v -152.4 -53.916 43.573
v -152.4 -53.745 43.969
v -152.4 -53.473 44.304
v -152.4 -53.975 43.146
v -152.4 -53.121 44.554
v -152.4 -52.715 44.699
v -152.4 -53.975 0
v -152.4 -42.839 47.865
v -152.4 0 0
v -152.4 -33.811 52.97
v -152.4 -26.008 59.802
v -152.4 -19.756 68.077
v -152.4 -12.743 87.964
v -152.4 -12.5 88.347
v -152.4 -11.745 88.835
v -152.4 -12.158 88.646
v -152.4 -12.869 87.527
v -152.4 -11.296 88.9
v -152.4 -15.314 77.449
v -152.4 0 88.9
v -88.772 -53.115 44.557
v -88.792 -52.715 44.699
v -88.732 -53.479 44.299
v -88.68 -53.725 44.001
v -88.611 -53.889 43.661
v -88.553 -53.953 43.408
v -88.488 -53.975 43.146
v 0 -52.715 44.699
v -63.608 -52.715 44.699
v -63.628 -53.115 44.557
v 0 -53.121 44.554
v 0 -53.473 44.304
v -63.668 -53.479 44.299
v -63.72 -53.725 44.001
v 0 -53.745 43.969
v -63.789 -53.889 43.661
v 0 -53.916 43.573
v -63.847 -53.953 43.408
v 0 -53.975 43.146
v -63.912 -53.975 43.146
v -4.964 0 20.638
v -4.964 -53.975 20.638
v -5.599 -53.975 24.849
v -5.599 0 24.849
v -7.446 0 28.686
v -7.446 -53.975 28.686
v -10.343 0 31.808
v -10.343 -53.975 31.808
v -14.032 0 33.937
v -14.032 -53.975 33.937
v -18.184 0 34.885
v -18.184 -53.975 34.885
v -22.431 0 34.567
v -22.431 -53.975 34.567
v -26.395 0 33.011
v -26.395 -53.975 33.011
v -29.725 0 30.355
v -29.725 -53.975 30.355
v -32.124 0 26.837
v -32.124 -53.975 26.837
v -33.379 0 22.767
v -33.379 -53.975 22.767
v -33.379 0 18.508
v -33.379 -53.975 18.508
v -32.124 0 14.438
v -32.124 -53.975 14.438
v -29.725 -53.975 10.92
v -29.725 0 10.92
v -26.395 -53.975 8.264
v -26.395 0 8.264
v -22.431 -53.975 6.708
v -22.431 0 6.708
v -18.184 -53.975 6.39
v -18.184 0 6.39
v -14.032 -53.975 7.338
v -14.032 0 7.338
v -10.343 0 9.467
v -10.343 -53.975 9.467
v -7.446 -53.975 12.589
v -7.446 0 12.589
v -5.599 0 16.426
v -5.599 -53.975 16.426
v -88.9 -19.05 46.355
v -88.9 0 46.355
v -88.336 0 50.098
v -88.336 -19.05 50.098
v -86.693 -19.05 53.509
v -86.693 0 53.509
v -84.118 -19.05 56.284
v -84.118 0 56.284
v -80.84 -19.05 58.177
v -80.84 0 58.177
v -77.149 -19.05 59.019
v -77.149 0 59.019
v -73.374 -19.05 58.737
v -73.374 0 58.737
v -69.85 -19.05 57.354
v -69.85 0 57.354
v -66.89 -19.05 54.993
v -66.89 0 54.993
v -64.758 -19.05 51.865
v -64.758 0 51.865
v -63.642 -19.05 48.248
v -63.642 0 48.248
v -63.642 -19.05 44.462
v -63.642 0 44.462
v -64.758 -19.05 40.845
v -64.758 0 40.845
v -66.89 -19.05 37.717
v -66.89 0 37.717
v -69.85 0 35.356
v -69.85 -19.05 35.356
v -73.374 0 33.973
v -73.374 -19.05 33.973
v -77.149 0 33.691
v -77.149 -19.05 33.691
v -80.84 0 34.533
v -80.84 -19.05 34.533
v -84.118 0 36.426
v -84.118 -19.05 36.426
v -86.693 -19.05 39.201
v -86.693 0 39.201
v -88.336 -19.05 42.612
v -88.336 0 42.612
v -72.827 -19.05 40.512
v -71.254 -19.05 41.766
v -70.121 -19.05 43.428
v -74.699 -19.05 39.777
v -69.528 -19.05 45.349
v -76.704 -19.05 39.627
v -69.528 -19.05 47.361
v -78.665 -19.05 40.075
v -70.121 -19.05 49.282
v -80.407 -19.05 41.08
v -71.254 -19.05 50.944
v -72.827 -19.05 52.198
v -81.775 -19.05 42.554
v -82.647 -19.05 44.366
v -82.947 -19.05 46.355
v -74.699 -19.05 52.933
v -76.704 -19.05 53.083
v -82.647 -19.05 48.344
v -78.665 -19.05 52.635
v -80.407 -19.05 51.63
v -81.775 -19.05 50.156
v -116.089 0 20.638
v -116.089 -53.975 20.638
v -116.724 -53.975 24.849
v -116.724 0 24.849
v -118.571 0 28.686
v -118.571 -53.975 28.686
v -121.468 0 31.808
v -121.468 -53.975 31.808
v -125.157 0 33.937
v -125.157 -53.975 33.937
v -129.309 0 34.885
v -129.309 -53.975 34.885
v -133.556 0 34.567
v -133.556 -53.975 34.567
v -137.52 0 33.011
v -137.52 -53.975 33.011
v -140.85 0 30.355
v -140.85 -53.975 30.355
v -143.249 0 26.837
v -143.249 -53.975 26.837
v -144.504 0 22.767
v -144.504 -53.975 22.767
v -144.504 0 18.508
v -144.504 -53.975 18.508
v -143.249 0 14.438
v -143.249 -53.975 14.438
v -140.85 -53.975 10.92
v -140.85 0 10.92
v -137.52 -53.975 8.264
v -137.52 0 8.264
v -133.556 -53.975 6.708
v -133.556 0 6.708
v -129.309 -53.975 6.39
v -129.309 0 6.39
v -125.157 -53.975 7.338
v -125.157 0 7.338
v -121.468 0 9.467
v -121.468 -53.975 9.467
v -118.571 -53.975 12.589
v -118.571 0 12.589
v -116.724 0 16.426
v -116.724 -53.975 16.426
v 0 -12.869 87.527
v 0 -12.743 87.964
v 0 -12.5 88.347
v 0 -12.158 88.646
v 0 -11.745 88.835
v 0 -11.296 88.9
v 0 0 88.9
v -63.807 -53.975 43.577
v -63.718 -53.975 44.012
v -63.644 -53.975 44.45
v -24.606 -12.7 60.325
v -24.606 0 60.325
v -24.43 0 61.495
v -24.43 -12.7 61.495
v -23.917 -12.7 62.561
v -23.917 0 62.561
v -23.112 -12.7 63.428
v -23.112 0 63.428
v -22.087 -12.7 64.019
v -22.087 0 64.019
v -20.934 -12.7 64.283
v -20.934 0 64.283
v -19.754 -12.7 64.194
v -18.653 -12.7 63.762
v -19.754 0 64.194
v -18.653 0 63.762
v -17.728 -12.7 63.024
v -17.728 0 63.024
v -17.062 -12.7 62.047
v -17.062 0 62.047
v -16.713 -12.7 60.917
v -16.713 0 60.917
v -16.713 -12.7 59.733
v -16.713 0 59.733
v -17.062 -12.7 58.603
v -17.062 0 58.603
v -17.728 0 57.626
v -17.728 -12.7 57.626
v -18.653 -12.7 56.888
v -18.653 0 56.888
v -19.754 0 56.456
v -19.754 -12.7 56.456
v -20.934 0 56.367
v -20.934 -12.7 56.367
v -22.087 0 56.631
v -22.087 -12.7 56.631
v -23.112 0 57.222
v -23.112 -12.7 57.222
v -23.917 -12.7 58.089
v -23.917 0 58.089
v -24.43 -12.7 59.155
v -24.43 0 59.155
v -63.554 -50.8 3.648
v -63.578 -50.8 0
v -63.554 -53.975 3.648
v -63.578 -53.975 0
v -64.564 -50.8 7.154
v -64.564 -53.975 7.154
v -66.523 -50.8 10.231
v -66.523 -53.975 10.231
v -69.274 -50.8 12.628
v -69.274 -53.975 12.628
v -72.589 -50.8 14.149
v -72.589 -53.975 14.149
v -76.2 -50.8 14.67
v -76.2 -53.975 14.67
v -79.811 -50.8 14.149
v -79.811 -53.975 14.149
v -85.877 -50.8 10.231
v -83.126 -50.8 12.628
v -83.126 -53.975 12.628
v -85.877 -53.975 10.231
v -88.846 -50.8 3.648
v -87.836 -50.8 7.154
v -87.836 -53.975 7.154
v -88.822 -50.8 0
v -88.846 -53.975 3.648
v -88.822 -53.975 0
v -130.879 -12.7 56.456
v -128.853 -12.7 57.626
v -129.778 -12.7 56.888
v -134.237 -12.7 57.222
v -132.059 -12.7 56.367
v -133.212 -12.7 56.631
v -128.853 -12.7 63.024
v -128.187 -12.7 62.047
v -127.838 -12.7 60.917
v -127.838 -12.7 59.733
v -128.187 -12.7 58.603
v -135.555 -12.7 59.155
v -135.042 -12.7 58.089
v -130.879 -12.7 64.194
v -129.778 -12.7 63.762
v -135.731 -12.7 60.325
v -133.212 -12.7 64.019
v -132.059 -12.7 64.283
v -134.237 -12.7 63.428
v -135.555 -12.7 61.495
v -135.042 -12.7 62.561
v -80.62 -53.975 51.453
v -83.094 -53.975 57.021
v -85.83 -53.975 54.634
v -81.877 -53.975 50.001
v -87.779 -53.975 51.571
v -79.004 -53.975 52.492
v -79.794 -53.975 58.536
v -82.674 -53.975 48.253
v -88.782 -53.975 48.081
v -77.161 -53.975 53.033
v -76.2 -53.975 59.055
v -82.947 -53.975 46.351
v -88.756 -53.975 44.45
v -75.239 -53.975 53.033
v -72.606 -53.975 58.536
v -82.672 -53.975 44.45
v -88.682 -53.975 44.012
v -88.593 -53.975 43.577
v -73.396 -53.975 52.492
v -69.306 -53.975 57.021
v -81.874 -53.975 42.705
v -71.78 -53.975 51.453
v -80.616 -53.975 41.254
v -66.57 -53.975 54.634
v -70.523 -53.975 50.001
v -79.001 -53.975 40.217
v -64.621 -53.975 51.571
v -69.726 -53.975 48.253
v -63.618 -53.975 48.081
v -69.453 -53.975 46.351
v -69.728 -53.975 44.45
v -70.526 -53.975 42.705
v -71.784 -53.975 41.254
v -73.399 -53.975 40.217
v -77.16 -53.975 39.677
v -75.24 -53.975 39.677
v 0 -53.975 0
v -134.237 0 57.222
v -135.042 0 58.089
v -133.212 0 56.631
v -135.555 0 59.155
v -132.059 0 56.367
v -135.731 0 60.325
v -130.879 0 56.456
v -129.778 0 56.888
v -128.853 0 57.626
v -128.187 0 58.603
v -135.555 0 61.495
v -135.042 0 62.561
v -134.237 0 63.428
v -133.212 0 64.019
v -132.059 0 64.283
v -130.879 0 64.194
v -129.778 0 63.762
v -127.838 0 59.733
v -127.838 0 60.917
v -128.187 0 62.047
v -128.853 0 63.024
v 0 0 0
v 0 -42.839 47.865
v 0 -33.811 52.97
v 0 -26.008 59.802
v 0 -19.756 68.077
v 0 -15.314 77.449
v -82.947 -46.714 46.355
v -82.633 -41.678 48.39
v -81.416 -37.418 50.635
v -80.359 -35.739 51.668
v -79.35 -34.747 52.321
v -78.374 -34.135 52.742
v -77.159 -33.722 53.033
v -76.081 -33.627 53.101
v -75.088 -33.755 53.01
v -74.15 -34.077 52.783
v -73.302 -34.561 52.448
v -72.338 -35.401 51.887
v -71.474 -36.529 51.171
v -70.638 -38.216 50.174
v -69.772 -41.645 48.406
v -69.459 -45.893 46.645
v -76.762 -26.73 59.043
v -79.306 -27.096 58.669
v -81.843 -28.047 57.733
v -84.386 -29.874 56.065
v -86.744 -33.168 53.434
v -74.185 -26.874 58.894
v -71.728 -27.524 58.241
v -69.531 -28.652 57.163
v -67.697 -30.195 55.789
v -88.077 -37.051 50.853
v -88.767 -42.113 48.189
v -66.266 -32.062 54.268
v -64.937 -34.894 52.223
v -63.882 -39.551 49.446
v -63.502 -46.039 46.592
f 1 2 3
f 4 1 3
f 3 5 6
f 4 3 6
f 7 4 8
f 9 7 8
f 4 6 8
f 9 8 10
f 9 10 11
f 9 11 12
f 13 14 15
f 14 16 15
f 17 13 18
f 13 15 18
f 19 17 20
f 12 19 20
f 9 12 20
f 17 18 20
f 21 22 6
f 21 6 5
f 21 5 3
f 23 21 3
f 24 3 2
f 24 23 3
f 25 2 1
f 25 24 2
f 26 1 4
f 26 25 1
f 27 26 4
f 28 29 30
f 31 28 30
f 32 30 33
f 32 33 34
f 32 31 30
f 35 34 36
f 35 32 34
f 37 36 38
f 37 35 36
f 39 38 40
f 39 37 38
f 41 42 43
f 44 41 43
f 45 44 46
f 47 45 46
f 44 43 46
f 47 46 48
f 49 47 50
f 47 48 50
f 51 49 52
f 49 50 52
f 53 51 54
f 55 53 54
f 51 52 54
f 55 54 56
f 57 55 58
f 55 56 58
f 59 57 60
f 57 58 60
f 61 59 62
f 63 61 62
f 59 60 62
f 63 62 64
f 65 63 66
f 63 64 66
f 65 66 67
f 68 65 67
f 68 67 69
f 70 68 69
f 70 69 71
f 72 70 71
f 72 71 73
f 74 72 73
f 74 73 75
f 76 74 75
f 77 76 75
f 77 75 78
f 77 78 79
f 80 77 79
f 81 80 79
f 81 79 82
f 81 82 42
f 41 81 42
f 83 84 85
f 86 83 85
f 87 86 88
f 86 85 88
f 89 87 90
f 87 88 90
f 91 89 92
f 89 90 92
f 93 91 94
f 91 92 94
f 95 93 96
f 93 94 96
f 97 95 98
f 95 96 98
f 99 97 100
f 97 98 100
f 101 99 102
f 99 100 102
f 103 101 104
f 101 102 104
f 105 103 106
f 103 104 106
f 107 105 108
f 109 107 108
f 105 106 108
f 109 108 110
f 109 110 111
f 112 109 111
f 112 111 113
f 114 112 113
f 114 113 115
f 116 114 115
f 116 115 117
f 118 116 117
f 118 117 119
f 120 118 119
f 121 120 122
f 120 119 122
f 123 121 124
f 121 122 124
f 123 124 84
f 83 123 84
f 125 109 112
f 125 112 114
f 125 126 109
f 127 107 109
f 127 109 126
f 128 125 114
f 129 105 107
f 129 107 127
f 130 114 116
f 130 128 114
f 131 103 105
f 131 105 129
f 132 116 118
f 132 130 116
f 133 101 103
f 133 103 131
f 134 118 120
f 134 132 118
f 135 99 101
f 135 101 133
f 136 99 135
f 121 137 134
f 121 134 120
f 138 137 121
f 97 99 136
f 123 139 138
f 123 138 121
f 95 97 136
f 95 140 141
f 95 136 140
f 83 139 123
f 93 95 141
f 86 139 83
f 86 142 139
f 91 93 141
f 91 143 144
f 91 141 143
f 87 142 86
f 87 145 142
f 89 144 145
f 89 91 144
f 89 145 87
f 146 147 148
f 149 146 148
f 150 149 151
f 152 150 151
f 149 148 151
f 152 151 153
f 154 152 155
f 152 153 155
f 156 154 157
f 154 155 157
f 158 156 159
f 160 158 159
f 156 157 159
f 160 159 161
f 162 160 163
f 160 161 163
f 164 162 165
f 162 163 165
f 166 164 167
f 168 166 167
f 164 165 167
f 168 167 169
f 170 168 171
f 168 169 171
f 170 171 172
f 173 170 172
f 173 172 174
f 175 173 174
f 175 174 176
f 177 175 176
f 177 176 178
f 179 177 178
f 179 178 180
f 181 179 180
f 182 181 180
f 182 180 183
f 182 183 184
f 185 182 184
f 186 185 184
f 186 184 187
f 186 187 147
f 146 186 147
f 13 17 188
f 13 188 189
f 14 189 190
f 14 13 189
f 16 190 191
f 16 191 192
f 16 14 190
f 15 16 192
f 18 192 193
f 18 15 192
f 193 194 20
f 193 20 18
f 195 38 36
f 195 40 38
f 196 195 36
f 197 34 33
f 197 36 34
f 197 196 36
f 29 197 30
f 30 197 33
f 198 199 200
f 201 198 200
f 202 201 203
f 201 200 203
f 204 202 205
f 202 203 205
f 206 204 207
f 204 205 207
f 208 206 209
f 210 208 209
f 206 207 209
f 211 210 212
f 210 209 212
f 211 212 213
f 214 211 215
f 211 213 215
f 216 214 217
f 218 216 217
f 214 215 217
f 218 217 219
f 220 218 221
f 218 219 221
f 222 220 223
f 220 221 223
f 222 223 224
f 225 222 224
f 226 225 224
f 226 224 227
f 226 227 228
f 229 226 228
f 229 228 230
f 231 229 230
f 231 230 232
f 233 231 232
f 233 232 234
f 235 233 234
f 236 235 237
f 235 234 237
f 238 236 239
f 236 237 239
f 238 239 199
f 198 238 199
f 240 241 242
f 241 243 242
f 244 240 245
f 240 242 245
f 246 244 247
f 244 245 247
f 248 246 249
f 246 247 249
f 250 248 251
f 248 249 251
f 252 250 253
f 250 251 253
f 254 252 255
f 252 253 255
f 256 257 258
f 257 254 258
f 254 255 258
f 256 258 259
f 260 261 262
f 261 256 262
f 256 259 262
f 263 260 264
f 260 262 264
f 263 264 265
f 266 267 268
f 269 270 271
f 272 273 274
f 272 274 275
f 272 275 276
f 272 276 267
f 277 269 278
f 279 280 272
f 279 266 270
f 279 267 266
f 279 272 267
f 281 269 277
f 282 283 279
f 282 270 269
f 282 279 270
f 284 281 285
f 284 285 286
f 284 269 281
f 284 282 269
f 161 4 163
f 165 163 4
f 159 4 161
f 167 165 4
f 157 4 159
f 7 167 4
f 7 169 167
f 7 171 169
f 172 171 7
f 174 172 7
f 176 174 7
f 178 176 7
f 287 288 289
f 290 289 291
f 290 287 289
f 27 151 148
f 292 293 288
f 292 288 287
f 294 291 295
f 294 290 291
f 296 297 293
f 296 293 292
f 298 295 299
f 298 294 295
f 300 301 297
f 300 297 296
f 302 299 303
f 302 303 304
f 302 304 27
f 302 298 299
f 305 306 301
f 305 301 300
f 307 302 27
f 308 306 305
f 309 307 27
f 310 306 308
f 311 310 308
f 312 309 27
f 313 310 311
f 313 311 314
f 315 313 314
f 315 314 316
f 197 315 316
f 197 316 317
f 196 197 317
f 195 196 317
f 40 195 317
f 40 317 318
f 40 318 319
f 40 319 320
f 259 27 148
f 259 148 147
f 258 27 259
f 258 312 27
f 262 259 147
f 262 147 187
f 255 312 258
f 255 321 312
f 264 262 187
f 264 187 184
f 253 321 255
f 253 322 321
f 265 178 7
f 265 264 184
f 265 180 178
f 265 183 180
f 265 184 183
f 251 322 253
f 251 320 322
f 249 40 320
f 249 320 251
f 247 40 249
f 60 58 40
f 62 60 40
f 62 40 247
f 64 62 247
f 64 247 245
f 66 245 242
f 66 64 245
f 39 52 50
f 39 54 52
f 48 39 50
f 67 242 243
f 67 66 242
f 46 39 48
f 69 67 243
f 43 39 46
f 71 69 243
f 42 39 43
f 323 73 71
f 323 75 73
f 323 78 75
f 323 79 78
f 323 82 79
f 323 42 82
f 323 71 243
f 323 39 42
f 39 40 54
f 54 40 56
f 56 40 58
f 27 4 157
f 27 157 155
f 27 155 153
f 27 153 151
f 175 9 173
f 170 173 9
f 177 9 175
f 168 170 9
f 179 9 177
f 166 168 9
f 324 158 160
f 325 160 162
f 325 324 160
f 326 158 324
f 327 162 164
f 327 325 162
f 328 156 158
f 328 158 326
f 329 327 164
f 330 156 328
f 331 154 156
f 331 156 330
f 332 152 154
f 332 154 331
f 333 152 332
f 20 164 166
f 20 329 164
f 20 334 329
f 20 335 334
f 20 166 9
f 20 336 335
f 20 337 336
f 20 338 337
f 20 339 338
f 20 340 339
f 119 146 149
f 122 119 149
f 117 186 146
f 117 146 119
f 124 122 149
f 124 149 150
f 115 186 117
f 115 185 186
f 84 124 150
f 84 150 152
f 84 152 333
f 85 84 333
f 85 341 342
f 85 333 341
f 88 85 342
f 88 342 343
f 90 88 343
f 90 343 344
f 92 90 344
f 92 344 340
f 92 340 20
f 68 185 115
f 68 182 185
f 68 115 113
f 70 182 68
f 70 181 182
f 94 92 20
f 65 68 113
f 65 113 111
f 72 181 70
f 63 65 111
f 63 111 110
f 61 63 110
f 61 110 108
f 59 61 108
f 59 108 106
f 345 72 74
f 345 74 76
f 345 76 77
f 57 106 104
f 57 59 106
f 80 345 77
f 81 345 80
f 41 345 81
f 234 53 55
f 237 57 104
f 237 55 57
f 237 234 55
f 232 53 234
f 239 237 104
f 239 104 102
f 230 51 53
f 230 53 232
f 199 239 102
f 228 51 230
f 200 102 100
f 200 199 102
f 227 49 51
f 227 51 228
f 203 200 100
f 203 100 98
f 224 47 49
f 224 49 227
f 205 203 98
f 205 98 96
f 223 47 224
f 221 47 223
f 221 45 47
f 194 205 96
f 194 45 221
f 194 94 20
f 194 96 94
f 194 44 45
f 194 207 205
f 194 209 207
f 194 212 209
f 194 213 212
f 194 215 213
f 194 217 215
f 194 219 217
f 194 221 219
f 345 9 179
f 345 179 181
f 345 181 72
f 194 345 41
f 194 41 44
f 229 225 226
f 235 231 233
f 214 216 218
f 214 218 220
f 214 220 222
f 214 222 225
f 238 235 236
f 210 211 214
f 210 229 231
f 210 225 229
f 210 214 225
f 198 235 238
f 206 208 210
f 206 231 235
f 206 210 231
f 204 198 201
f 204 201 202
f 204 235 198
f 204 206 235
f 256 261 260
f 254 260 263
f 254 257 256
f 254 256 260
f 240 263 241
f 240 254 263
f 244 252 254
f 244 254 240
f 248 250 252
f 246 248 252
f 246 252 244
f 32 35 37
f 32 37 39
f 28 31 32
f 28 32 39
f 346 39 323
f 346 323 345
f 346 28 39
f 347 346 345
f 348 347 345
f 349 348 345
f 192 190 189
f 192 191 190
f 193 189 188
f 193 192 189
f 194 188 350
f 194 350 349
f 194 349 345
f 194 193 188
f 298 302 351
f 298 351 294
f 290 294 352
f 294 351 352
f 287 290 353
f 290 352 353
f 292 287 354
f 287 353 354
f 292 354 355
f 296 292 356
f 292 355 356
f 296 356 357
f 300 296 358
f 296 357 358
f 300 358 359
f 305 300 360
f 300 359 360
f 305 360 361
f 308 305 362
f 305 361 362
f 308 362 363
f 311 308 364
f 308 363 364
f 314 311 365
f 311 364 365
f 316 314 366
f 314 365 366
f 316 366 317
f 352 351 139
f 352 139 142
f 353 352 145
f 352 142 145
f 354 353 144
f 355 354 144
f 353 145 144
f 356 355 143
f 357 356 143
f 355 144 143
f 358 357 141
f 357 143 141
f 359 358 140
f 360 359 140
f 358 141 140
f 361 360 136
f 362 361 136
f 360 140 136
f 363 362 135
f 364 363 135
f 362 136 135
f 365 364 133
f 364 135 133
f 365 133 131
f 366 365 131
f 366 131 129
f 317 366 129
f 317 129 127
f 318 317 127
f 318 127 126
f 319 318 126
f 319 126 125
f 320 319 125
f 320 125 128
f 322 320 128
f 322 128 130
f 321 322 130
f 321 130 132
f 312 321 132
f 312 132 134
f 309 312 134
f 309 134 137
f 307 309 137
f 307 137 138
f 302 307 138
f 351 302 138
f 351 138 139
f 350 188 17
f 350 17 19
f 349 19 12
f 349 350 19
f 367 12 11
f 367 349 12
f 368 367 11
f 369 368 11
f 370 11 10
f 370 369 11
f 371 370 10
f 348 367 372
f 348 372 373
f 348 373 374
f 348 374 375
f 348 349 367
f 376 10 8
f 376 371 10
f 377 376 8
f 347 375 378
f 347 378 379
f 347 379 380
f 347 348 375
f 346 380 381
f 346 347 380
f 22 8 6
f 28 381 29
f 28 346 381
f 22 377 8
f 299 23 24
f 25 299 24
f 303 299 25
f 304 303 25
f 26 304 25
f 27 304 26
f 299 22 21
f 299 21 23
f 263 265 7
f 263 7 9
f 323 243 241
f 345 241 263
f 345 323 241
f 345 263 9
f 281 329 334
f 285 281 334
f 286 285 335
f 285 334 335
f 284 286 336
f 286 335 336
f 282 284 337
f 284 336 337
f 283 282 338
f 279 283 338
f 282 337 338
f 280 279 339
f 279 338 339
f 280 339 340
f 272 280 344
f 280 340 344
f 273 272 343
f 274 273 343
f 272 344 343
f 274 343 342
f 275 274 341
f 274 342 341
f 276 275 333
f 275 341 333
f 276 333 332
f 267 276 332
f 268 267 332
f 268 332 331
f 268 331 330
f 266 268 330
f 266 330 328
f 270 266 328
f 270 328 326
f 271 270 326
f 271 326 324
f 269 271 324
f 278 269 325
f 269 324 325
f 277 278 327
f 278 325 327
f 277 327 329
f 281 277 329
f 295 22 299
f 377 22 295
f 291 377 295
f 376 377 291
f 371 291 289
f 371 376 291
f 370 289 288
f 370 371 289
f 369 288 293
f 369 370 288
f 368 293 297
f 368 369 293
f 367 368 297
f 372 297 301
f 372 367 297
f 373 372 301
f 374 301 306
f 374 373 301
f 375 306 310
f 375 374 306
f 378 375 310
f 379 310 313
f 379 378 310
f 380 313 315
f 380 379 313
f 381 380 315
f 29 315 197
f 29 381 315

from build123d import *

# Parameters (mm, degrees)
F1_DEPTH      = 152.4
F2_R          = 14.2875
F3_DEPTH      = 101.6
F4_R          = 12.7
F4_R_2        = 6.746875
F5_DEPTH      = 19.05
F6_DEPTH      = 76.2
F7_DEPTH      = 34.925
F8_R          = 12.7653078778
F9_DEPTH      = 3.175
F10_T1_DEPTH  = 159.4216090421
F10_T6_DEPTH  = 70.1643898363
F10_S7_R      = 12.7
F10_T8_DEPTH  = 37
F10_T12_DEPTH = 70.1643898363
F10_S13_R     = 12.7
F10_T14_DEPTH = 37
F11_R         = 3.96875
F12_DEPTH     = 12.7


# Not quite as in the source:
# - a fillet or chamfer that OpenCascade refuses, or shapes differently, is made with other operations: its cross-section is extruded or revolved along the edge and cut away or added
# - a length typed as a fraction of an inch, garbled in the dataset ("3 / 203.2 mm" for 3/8 in), is restored


with BuildPart() as f1:
    # F0 (on Right) → F1 (new body)
    with BuildSketch(Plane.YZ):
        with BuildLine():
            Line((-53.975, 44.45), (-53.975, 0))
            Line((-53.975, 0), (0, 0))
            Line((0, 0), (0, 88.9))
            Line((0, 88.9), (-12.7, 88.9))
            ThreePointArc((-12.7, 88.9), (-25.9749076509, 59.8383071044), (-53.975, 44.45))
        make_face()
    extrude(amount=-F1_DEPTH)

    # F2 (on face) → F3 (cut)
    with BuildSketch(Plane.XZ.offset(53.975)):
        with Locations((-130.3763389587, 20.6375)):
            Circle(F2_R)
        with Locations((-19.2513389587, 20.6375)):
            Circle(F2_R)
    extrude(amount=-F3_DEPTH, mode=Mode.SUBTRACT)

    # F4 (on face) → F5 (cut)
    with BuildSketch(Plane(origin=(0, 0, 0), x_dir=(-1, 0, 0), z_dir=(0, 1, 0))):
        with Locations((76.2, 46.355)):
            Circle(F4_R)
        with Locations((76.2, 46.355)):
            Circle(F4_R_2, mode=Mode.SUBTRACT)
    extrude(amount=-F5_DEPTH, mode=Mode.SUBTRACT)

    # F6 (cut): a face of the model
    f6_faces = [f1.faces().sort_by_distance(p)[0] for p in [
        (-76.2, 0, 46.355),
    ]]
    extrude(f6_faces, amount=-F6_DEPTH, mode=Mode.SUBTRACT)

    # F7 (add, through all): a face of the model
    f7_faces = [f1.faces().sort_by_distance(p)[0] for p in [
        (-63.8592102448, -19.05, 46.355),
    ]]
    extrude(f7_faces, amount=-F7_DEPTH)

    # F8 (on face) → F9 (cut)
    with BuildSketch(Plane.XZ.offset(53.975)):
        with Locations((-76.2, 1.905)):
            Circle(F8_R)
    extrude(amount=-F9_DEPTH, mode=Mode.SUBTRACT)

    # F10: fillet of radius 1.5875 on 3 edges, made by hand

    # F10_s2 → F10_t1 (cut)
    with BuildSketch(Plane.YZ.offset(-155.9108045211)):
        with BuildLine():
            ThreePointArc((-12.8685611865, 87.5274309986), (-12.3394581707, 88.5086101977), (-11.2956781916, 88.9))
            Line((-11.2956781916, 88.9), (-12.7, 88.9))
            ThreePointArc((-12.7, 88.9), (-12.7796098579, 88.2131418999), (-12.8685611865, 87.5274309986))
        make_face()
    extrude(amount=F10_T1_DEPTH, mode=Mode.SUBTRACT)


with BuildPart() as f10_tool4:
    # F10_s5 → F10_t6 (new body)
    with BuildSketch(Plane.YZ.offset(-85.4959611607)):
        with BuildLine():
            ThreePointArc((-52.7151762735, 44.6991736422), (-53.6204522161, 44.1458521426), (-53.975, 43.1458596012))
            Line((-53.975, 43.1458596012), (-53.975, 44.45))
            ThreePointArc((-53.975, 44.45), (-53.3443007137, 44.5706056045), (-52.7151762735, 44.6991736422))
        make_face()
    extrude(amount=-F10_T6_DEPTH)

    # F10_s7 → F10_t8 (cut, symmetric)
    with BuildSketch(Plane.XZ.offset(53.3)):
        with Locations((-76.2, 46.355)):
            Circle(F10_S7_R)
    extrude(amount=F10_T8_DEPTH, both=True, mode=Mode.SUBTRACT)


with BuildPart() as f1_1:
    add(f1.part)

    # F10_t3: cut F10_tool4
    add(f10_tool4.part, mode=Mode.SUBTRACT)


with BuildPart() as f10_tool10:
    # F10_s11 → F10_t12 (new body)
    with BuildSketch(Plane.YZ.offset(3.2603509969)):
        with BuildLine():
            ThreePointArc((-52.7151762735, 44.6991736422), (-53.6204522161, 44.1458521426), (-53.975, 43.1458596012))
            Line((-53.975, 43.1458596012), (-53.975, 44.45))
            ThreePointArc((-53.975, 44.45), (-53.3443007137, 44.5706056045), (-52.7151762735, 44.6991736422))
        make_face()
    extrude(amount=-F10_T12_DEPTH)

    # F10_s13 → F10_t14 (cut, symmetric)
    with BuildSketch(Plane.XZ.offset(53.3)):
        with Locations((-76.2, 46.355)):
            Circle(F10_S13_R)
    extrude(amount=F10_T14_DEPTH, both=True, mode=Mode.SUBTRACT)


with BuildPart() as f1_2:
    add(f1_1.part)

    # F10_t9: cut F10_tool10
    add(f10_tool10.part, mode=Mode.SUBTRACT)

    # F11 (on face) → F12 (cut)
    with BuildSketch(Plane(origin=(0, 0, 0), x_dir=(-1, 0, 0), z_dir=(0, 1, 0))):
        with Locations((20.6375, 60.325)):
            Circle(F11_R)
        with Locations((131.7625, 60.325)):
            Circle(F11_R)
    extrude(amount=-F12_DEPTH, mode=Mode.SUBTRACT)


solid = f1_2.part
